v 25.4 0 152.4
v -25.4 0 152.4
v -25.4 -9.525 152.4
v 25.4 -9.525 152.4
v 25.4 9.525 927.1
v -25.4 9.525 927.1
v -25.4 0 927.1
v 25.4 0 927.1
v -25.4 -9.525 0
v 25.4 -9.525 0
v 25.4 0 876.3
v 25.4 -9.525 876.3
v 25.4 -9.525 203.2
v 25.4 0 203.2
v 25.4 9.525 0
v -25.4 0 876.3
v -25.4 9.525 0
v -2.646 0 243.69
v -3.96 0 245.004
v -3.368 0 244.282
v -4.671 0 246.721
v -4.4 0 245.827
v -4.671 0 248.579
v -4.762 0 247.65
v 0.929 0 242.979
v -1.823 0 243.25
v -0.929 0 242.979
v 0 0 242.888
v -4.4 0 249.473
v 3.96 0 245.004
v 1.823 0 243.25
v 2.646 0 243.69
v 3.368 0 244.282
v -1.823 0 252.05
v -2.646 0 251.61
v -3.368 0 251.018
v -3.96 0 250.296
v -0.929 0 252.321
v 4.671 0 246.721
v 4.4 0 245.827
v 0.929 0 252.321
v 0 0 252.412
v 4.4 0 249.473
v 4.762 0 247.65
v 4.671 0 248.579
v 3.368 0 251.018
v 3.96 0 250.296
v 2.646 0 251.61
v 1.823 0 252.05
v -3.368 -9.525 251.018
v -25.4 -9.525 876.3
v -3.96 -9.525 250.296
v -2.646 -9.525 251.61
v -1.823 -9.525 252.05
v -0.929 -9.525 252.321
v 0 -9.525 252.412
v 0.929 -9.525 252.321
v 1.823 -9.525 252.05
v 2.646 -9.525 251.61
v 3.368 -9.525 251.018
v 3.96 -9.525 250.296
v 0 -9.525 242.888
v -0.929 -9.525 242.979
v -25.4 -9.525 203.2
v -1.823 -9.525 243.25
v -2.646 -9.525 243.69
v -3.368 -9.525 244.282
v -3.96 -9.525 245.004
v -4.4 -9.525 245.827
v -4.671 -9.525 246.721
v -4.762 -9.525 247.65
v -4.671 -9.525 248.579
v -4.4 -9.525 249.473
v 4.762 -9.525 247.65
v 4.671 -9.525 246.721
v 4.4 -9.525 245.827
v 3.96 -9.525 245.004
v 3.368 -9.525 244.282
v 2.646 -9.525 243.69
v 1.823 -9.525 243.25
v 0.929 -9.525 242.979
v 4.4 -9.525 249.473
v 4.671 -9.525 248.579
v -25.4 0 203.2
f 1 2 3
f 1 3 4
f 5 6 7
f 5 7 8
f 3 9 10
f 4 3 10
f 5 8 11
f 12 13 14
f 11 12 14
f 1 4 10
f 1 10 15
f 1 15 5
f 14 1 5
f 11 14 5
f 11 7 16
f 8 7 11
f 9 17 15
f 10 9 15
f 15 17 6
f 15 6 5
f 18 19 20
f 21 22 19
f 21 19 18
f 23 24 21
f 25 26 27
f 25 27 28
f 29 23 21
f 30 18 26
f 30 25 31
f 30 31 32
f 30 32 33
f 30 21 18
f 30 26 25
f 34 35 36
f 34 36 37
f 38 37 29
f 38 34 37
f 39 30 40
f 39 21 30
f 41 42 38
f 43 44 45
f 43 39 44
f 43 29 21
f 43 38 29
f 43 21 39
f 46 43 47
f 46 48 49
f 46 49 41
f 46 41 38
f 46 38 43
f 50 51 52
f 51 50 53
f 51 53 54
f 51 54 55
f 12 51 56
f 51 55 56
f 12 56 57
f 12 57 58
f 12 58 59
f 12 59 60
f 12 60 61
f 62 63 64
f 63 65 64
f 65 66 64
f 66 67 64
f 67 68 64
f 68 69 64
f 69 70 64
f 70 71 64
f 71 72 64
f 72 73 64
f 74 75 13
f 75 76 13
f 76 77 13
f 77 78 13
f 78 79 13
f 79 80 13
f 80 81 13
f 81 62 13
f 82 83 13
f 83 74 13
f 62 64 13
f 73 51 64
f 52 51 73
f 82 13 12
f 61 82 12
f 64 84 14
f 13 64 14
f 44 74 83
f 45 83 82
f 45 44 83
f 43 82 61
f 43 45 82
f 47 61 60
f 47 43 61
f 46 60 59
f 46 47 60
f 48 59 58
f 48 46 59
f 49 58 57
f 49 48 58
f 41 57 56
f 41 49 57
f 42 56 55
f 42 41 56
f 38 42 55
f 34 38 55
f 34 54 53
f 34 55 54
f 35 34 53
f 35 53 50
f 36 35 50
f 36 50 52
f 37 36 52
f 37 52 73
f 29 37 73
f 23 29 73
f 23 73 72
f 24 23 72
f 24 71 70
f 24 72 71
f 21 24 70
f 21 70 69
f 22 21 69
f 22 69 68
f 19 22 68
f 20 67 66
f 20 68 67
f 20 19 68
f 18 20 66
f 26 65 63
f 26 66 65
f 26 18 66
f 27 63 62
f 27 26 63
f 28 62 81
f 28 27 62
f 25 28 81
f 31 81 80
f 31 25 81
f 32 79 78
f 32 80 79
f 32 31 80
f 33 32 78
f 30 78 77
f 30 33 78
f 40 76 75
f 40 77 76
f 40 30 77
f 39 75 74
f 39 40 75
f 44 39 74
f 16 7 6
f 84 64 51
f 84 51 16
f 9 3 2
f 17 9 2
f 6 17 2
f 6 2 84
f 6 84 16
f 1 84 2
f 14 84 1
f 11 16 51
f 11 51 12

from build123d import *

# Parameters (mm, degrees)
F0_W     = 50.8
F0_H     = 19.05
F1_DEPTH = 927.1
F2_W     = 122.43557321
F2_H     = 50.8
F2_W_2   = 343.1604206562
F3_DEPTH = 25.4
F4_R     = 4.7625
F5_DEPTH = 25.4


# Not quite as in the source:
# - a feature names something its author has since deleted; it is built from what else it names


with BuildPart() as f1:
    # F0 (on Top) → F1 (new body)
    with BuildSketch(Plane.XY):
        Rectangle(F0_W, F0_H)
    extrude(amount=F1_DEPTH)

    # F2 (on Front) → F3 (cut)
    with BuildSketch(Plane.XZ):
        with Locations((22.4465244144, 177.8)):
            Rectangle(F2_W, F2_H)
        with Locations((-38.7818217278, 901.7)):
            Rectangle(F2_W_2, F2_H)
    extrude(amount=F3_DEPTH, mode=Mode.SUBTRACT)

    # F4 (on Front) → F5 (cut)
    with BuildSketch(Plane.XZ):
        with Locations((0, 247.65)):
            Circle(F4_R)
    extrude(amount=F5_DEPTH, mode=Mode.SUBTRACT)


solid = f1.part
